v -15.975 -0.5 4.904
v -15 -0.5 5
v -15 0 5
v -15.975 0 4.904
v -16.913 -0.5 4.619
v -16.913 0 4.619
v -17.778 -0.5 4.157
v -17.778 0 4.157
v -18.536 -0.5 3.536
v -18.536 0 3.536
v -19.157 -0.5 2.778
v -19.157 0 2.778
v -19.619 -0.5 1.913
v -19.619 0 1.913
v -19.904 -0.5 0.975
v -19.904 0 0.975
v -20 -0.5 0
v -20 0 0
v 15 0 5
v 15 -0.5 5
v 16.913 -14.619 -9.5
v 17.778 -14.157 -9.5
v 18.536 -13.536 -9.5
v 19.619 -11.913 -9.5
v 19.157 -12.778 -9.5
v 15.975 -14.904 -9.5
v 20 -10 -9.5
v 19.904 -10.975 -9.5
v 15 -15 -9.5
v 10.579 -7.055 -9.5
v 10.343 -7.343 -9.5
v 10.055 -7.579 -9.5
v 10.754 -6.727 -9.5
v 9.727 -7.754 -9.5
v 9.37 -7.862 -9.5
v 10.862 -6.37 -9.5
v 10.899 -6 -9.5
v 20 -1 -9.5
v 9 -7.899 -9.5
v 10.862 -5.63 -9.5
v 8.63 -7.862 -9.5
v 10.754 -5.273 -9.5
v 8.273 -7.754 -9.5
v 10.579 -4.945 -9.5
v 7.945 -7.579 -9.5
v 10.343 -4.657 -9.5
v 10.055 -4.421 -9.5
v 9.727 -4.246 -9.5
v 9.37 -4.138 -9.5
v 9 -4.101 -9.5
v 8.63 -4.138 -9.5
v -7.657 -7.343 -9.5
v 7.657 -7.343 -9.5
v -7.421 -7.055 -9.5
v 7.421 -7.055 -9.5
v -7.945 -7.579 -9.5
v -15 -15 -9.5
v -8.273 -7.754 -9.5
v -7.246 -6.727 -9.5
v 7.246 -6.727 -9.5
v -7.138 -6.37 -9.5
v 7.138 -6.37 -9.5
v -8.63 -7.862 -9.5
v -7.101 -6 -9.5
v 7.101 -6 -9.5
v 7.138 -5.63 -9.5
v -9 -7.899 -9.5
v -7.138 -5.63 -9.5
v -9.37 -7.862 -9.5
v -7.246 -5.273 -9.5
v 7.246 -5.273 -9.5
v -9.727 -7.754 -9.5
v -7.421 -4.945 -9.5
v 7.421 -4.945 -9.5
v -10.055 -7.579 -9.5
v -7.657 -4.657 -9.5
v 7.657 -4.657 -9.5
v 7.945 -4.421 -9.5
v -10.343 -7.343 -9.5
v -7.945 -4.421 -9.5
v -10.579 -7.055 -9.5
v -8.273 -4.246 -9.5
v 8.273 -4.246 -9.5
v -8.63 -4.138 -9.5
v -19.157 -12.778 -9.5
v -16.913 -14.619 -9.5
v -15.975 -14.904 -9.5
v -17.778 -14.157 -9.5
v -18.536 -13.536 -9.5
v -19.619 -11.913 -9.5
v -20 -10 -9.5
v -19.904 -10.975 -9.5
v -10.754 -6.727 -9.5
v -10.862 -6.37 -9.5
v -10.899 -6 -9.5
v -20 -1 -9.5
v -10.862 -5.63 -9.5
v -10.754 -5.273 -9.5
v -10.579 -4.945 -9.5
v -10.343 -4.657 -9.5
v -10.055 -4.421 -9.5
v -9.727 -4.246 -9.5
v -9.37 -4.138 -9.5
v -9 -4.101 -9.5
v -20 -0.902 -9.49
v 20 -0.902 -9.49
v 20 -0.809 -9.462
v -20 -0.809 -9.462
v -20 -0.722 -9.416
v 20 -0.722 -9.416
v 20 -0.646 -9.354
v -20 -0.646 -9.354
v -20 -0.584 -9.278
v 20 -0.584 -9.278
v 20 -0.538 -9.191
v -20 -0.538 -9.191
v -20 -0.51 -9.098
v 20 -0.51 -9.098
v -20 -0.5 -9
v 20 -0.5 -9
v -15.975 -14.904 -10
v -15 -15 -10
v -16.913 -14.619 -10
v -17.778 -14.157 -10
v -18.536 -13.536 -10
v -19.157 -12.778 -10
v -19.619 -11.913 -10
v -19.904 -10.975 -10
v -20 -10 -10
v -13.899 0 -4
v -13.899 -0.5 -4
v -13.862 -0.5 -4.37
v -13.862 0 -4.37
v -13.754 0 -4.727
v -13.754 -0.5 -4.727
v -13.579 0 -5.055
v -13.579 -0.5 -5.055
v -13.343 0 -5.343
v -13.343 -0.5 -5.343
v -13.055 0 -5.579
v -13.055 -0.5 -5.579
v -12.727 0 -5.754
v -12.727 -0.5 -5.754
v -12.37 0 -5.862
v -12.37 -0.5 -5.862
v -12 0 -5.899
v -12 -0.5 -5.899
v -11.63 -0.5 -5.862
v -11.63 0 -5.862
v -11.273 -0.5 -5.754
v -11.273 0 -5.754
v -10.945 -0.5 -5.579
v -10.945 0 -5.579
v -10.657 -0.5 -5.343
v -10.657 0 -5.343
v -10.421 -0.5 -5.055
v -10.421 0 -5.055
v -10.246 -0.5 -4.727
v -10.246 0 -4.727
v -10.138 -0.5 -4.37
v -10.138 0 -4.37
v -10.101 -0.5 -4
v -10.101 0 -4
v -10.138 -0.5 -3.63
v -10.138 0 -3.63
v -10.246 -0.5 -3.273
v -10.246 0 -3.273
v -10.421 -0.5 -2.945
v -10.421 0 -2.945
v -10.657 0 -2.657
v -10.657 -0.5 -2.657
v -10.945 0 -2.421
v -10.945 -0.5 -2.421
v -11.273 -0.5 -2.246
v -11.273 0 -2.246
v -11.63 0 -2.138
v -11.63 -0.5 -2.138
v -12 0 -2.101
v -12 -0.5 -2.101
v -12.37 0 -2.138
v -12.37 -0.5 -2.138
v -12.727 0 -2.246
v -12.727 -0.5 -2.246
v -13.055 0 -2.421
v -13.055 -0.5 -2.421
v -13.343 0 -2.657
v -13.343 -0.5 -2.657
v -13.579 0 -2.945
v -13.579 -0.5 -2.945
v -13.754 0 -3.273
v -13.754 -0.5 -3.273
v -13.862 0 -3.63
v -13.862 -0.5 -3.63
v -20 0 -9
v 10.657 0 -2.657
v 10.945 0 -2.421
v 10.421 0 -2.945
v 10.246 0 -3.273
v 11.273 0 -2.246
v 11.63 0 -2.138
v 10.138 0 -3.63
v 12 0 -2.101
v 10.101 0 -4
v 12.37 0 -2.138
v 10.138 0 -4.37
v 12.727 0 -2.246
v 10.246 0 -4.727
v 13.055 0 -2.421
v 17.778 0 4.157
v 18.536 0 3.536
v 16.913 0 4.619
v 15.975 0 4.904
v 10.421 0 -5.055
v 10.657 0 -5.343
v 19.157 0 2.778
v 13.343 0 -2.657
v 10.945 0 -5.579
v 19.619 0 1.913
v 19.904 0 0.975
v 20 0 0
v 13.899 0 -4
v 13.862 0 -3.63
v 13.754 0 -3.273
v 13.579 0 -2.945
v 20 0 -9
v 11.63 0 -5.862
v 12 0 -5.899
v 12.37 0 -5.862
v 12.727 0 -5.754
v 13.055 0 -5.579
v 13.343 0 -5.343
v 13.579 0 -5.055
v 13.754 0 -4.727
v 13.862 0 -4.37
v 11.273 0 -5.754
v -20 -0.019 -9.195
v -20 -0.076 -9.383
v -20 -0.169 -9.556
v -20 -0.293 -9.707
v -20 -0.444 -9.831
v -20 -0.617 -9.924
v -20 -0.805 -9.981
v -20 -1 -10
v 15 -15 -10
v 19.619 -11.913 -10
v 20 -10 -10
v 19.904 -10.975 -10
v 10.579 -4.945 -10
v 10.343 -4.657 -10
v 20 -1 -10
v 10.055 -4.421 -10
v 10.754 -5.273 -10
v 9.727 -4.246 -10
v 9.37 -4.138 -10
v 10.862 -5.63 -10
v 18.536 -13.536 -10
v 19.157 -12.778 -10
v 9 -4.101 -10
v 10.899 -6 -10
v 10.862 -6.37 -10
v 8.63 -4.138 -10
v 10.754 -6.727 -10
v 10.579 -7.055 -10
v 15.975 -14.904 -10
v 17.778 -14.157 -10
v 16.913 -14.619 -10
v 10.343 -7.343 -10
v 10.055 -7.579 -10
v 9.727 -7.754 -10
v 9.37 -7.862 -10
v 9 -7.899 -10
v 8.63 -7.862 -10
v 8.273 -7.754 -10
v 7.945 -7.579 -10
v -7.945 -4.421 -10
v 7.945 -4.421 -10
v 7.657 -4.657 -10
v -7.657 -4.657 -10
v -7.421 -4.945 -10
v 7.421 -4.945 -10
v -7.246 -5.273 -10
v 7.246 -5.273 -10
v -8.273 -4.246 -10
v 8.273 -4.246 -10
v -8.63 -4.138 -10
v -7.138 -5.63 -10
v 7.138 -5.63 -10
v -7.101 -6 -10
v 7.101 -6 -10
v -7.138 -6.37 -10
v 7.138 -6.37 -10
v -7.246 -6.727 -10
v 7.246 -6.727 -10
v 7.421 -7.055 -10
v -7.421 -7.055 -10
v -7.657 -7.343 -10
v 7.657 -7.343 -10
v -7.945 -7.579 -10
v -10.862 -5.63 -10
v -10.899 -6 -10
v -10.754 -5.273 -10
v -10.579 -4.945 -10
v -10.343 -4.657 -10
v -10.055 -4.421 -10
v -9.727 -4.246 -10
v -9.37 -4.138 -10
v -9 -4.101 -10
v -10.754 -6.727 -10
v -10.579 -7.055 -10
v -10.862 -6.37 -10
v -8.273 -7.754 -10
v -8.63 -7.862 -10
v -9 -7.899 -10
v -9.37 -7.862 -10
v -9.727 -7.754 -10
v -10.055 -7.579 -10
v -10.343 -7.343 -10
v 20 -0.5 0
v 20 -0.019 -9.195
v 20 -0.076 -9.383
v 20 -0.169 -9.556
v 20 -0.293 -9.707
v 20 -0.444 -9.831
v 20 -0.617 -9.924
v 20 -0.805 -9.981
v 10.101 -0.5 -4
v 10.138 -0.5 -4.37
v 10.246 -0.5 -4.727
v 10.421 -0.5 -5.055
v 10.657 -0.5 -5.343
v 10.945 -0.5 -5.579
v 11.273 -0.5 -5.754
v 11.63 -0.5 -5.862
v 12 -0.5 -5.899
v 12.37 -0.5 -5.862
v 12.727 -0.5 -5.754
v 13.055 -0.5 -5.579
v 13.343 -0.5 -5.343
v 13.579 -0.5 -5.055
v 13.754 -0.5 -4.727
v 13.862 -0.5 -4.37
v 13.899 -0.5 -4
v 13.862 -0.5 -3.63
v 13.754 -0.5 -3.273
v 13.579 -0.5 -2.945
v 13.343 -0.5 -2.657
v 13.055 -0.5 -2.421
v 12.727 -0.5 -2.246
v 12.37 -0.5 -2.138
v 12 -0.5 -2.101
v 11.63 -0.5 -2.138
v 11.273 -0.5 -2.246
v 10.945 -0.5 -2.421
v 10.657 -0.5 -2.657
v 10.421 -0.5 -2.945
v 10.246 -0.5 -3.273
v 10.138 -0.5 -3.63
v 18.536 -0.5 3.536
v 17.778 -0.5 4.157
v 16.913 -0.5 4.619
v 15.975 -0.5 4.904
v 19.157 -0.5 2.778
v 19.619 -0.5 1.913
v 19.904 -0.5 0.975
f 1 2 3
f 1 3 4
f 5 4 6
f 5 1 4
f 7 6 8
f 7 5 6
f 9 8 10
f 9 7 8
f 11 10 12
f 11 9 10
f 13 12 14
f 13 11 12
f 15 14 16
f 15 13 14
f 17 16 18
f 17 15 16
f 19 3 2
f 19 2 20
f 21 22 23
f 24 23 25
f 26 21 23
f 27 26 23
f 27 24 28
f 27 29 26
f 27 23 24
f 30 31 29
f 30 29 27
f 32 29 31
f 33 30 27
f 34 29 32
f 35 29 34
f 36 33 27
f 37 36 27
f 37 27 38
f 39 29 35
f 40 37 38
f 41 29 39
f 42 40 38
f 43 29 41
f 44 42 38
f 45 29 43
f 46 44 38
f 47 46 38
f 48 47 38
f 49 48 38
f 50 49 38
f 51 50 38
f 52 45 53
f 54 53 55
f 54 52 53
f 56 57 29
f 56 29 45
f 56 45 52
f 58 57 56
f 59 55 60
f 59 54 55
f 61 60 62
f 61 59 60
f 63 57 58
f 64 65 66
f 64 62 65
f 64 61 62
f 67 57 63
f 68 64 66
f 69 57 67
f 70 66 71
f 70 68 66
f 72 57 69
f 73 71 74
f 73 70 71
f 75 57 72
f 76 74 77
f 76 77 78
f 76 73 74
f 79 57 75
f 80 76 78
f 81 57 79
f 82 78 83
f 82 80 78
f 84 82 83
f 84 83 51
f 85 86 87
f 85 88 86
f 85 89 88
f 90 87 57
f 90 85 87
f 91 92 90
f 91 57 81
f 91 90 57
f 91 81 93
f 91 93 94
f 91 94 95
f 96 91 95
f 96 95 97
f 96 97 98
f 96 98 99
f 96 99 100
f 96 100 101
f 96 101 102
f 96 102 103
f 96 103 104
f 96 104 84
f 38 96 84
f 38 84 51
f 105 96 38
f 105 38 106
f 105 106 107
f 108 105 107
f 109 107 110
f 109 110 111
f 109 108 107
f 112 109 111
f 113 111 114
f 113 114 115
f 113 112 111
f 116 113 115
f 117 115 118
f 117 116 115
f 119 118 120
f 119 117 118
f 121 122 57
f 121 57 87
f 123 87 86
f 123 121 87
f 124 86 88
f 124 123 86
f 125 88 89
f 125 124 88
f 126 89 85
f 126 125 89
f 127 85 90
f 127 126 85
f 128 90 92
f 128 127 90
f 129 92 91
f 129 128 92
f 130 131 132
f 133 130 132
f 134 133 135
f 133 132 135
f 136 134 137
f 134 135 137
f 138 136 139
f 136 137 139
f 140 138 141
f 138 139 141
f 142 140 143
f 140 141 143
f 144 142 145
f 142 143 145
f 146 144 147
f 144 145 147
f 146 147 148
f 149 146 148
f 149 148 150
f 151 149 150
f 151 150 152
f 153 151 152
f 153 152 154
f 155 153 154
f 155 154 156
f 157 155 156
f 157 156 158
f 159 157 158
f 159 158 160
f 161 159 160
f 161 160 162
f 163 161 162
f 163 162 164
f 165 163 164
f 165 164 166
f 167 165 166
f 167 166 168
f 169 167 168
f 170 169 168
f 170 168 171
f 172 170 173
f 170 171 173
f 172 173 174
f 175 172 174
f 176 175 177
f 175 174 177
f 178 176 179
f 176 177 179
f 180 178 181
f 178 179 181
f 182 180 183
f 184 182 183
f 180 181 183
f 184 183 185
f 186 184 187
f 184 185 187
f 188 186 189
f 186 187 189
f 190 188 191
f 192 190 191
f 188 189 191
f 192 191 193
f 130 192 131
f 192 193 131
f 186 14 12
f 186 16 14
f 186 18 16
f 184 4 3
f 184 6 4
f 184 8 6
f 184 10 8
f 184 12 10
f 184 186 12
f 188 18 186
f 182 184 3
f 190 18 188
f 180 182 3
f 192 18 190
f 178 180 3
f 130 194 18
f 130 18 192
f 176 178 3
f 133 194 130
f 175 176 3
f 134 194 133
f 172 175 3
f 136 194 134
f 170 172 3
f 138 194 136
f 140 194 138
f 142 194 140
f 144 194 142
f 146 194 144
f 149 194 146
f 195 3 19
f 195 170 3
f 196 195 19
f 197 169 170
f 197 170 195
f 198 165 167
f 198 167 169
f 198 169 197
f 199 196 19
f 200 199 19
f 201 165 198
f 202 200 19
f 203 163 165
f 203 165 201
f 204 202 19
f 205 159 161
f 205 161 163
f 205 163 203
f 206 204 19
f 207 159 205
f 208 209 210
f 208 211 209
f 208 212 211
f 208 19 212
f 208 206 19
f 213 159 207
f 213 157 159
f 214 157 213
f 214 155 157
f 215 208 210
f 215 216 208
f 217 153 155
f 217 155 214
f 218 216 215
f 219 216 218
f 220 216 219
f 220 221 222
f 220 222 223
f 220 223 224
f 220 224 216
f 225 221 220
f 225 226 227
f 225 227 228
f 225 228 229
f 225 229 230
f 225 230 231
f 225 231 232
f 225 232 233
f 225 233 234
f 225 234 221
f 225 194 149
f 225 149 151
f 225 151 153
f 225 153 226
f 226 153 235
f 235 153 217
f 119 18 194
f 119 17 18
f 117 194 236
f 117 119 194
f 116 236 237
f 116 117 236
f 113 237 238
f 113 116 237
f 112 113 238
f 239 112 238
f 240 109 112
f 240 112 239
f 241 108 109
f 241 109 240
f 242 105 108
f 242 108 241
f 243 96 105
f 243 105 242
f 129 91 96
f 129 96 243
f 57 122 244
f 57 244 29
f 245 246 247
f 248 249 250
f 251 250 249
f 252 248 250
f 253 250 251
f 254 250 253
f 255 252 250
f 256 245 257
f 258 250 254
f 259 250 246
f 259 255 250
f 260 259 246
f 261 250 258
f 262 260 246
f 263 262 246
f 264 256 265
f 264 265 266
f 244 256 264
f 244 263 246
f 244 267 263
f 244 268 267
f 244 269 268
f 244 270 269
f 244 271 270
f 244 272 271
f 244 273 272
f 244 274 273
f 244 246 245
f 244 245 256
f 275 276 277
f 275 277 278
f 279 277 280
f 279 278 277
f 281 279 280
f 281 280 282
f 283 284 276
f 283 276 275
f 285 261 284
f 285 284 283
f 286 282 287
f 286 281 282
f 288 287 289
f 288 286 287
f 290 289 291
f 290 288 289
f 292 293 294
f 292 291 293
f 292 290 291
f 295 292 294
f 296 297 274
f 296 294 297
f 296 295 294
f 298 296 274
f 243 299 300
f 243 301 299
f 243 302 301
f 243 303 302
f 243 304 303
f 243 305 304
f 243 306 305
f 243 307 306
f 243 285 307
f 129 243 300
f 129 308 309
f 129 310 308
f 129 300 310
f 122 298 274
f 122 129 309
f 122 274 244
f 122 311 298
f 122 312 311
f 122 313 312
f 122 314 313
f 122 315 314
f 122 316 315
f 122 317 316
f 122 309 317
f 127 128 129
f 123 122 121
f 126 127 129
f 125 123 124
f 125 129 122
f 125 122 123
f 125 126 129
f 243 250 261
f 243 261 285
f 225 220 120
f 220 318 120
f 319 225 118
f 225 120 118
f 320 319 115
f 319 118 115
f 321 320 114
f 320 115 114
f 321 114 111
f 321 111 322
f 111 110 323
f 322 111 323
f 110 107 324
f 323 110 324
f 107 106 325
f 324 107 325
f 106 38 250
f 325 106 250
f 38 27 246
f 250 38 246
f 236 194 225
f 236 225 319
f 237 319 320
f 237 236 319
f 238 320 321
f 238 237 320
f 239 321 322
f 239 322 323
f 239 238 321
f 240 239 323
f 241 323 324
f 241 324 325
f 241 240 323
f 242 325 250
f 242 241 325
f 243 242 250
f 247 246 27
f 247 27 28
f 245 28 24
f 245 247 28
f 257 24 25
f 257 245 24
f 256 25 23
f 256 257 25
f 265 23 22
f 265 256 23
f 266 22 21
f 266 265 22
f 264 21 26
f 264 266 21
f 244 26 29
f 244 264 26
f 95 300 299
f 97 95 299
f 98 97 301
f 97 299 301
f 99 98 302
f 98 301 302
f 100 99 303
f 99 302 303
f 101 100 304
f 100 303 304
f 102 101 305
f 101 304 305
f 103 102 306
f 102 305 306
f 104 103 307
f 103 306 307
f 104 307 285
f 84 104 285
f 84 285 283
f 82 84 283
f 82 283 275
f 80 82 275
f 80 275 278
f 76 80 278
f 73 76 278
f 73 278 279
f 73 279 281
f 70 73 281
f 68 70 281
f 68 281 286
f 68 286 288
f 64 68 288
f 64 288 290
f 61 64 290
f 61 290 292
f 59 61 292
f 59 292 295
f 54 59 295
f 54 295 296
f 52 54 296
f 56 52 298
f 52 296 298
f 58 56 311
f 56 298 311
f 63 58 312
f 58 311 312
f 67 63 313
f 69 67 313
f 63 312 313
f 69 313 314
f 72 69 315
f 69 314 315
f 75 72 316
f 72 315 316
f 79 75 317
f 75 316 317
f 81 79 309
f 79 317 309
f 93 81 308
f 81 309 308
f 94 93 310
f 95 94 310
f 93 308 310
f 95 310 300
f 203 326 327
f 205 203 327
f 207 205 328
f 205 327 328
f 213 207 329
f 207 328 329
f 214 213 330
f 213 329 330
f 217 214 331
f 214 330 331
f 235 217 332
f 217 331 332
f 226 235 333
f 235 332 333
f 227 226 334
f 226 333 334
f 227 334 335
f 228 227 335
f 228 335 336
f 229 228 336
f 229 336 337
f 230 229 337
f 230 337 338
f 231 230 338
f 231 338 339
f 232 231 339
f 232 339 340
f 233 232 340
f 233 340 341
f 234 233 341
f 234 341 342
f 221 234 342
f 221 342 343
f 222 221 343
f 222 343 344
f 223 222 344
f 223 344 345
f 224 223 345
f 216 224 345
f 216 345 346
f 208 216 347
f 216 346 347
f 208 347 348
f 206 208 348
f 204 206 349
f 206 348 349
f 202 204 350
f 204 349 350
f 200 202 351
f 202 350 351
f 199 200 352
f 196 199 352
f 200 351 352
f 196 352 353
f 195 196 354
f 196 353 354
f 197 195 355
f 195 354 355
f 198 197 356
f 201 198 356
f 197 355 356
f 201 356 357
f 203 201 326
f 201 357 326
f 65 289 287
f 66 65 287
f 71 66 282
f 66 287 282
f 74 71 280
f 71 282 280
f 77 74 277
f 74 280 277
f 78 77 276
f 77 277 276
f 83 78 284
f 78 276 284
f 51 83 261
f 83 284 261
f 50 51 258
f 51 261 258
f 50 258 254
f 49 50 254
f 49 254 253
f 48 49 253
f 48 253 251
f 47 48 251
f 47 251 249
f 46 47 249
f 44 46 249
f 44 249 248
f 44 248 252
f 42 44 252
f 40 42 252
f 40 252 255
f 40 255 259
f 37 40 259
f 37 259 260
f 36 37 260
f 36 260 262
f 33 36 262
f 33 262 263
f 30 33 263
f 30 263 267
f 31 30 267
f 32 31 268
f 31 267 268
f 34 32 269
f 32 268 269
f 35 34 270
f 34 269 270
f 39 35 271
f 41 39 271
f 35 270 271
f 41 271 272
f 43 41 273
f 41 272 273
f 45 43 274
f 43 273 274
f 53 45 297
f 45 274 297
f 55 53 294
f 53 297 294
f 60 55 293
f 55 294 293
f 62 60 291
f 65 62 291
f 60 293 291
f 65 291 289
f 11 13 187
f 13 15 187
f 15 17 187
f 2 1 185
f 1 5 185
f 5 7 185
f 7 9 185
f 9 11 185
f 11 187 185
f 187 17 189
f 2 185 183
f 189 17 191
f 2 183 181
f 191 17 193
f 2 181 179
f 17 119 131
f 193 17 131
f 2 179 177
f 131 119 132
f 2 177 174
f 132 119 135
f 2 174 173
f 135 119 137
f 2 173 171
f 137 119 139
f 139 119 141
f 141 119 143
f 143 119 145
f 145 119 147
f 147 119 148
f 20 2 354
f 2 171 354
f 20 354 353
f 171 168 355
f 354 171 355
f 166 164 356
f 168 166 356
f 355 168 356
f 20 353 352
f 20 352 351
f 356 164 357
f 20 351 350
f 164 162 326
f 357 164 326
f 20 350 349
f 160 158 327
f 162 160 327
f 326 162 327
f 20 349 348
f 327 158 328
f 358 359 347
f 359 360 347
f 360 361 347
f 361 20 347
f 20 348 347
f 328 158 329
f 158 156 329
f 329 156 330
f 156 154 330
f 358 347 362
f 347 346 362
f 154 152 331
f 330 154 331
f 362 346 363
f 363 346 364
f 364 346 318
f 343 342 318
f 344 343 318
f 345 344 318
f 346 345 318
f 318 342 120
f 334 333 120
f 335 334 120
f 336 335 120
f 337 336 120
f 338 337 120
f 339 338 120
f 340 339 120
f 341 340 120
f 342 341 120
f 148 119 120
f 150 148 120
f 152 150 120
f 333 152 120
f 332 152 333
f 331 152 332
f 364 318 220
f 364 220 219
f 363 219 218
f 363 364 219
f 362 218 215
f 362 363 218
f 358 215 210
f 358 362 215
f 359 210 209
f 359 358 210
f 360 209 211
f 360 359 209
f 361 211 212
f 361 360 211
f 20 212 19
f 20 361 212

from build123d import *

# Parameters (mm, degrees)
SKETCH1_W                    = 40
SKETCH1_H                    = 15
BASE_FLANGE1_DEPTH           = 0.5
EDGE_FLANGE1_STRIP_W         = 3
EDGE_FLANGE1_STRIP_H         = 0.5
EDGE_FLANGE1_STRIP_CUT_DEPTH = 40
EDGE_FLANGE1_DEPTH           = 40
F_6_CLEARANCE_HOLE2_D        = 3.7973
F_6_CLEARANCE_HOLE2_DEPTH    = 10
F_6_CLEARANCE_HOLE2_TIP      = 1.140824014
F_6_CLEARANCE_HOLE3_D        = 3.7973
BREAK_CORNER1_START          = -10
BREAK_CORNER1_DEPTH          = 0.5
BREAK_CORNER1_START_2        = -0.5
BREAK_CORNER1_2_DEPTH        = 0.5


# Read off the part's stored shape, not the designer's step: Break-Corner1
# Sheet-metal steps are written as plain solids
with BuildPart() as part:
    # Sketch1 → Base-Flange1 (new body)
    with BuildSketch(Plane(origin=(0, 0, 0), x_dir=(1, 0, 0), z_dir=(0, 1, 0))):
        with Locations((0, 2.5)):
            Rectangle(SKETCH1_W, SKETCH1_H)
    extrude(amount=-BASE_FLANGE1_DEPTH)

    # Edge-Flange1 strip (across the edge) → Edge-Flange1 strip cut (cut)
    with BuildSketch(Plane(origin=(-20, -0.5, -10), x_dir=(0, 0, 1), z_dir=(1, 0, 0))):
        with Locations((-0.5, -0.25)):
            Rectangle(EDGE_FLANGE1_STRIP_W, EDGE_FLANGE1_STRIP_H)
    extrude(amount=EDGE_FLANGE1_STRIP_CUT_DEPTH, mode=Mode.SUBTRACT)

    # Edge-Flange1 section (across the edge) → Edge-Flange1 (add)
    with BuildSketch(Plane(origin=(-20, -0.5, -10), x_dir=(0, 0, 1), z_dir=(1, 0, 0))):
        with BuildLine():
            Line((0, 0.5), (0, 14.5))
            Line((0, 14.5), (0.5, 14.5))
            Line((0.5, 14.5), (0.5, 0.5))
            ThreePointArc((0.5, 0.5), (0.646446609, 0.146446609), (1, 0))
            Line((1, 0), (1, -0.5))
            ThreePointArc((1, -0.5), (0.292893219, -0.207106781), (0, 0.5))
        make_face()
    extrude(amount=EDGE_FLANGE1_DEPTH)

    # #6 Clearance Hole2
    with Locations(Plane.XY.offset(-9.5)):
        with Locations((-9, -6), (9, -6)):
            Hole(F_6_CLEARANCE_HOLE2_D / 2, depth=F_6_CLEARANCE_HOLE2_DEPTH)
            with Locations((0, 0, -(F_6_CLEARANCE_HOLE2_DEPTH + F_6_CLEARANCE_HOLE2_TIP / 2))):  # 118° drill point
                Cone(0, F_6_CLEARANCE_HOLE2_D / 2, F_6_CLEARANCE_HOLE2_TIP, mode=Mode.SUBTRACT)

    # #6 Clearance Hole3 (through all)
    with Locations(Plane(origin=(0, 0, 0), x_dir=(1, 0, 0), z_dir=(0, 1, 0))):
        with Locations((12, 4), (-12, 4)):
            Hole(F_6_CLEARANCE_HOLE3_D / 2)

    # Break-Corner1 outline → Break-Corner1 (cut)
    with BuildSketch(Plane.XY.offset(BREAK_CORNER1_START)):
        with BuildLine():
            Line((-20, -15), (-15, -15))
            ThreePointArc((-15, -15), (-18.535533906, -13.535533906), (-20, -10))
            Line((-20, -10), (-20, -15))
        make_face()
        with BuildLine():
            ThreePointArc((20, -10), (18.535533906, -13.535533906), (15, -15))
            Line((15, -15), (20, -15))
            Line((20, -15), (20, -10))
        make_face()
    extrude(amount=BREAK_CORNER1_DEPTH, mode=Mode.SUBTRACT)

    # Break-Corner1 2 outline → Break-Corner1 2 (cut)
    with BuildSketch(Plane(origin=(0, 0, 0), x_dir=(1, 0, 0), z_dir=(0, 1, 0)).offset(BREAK_CORNER1_START_2)):
        with BuildLine():
            ThreePointArc((20, 0), (18.535533906, -3.535533906), (15, -5))
            Line((15, -5), (20, -5))
            Line((20, -5), (20, 0))
        make_face()
        with BuildLine():
            ThreePointArc((-15, -5), (-18.535533906, -3.535533906), (-20, 0))
            Line((-20, 0), (-20, -5))
            Line((-20, -5), (-15, -5))
        make_face()
    extrude(amount=BREAK_CORNER1_2_DEPTH, mode=Mode.SUBTRACT)


solid = part.part
